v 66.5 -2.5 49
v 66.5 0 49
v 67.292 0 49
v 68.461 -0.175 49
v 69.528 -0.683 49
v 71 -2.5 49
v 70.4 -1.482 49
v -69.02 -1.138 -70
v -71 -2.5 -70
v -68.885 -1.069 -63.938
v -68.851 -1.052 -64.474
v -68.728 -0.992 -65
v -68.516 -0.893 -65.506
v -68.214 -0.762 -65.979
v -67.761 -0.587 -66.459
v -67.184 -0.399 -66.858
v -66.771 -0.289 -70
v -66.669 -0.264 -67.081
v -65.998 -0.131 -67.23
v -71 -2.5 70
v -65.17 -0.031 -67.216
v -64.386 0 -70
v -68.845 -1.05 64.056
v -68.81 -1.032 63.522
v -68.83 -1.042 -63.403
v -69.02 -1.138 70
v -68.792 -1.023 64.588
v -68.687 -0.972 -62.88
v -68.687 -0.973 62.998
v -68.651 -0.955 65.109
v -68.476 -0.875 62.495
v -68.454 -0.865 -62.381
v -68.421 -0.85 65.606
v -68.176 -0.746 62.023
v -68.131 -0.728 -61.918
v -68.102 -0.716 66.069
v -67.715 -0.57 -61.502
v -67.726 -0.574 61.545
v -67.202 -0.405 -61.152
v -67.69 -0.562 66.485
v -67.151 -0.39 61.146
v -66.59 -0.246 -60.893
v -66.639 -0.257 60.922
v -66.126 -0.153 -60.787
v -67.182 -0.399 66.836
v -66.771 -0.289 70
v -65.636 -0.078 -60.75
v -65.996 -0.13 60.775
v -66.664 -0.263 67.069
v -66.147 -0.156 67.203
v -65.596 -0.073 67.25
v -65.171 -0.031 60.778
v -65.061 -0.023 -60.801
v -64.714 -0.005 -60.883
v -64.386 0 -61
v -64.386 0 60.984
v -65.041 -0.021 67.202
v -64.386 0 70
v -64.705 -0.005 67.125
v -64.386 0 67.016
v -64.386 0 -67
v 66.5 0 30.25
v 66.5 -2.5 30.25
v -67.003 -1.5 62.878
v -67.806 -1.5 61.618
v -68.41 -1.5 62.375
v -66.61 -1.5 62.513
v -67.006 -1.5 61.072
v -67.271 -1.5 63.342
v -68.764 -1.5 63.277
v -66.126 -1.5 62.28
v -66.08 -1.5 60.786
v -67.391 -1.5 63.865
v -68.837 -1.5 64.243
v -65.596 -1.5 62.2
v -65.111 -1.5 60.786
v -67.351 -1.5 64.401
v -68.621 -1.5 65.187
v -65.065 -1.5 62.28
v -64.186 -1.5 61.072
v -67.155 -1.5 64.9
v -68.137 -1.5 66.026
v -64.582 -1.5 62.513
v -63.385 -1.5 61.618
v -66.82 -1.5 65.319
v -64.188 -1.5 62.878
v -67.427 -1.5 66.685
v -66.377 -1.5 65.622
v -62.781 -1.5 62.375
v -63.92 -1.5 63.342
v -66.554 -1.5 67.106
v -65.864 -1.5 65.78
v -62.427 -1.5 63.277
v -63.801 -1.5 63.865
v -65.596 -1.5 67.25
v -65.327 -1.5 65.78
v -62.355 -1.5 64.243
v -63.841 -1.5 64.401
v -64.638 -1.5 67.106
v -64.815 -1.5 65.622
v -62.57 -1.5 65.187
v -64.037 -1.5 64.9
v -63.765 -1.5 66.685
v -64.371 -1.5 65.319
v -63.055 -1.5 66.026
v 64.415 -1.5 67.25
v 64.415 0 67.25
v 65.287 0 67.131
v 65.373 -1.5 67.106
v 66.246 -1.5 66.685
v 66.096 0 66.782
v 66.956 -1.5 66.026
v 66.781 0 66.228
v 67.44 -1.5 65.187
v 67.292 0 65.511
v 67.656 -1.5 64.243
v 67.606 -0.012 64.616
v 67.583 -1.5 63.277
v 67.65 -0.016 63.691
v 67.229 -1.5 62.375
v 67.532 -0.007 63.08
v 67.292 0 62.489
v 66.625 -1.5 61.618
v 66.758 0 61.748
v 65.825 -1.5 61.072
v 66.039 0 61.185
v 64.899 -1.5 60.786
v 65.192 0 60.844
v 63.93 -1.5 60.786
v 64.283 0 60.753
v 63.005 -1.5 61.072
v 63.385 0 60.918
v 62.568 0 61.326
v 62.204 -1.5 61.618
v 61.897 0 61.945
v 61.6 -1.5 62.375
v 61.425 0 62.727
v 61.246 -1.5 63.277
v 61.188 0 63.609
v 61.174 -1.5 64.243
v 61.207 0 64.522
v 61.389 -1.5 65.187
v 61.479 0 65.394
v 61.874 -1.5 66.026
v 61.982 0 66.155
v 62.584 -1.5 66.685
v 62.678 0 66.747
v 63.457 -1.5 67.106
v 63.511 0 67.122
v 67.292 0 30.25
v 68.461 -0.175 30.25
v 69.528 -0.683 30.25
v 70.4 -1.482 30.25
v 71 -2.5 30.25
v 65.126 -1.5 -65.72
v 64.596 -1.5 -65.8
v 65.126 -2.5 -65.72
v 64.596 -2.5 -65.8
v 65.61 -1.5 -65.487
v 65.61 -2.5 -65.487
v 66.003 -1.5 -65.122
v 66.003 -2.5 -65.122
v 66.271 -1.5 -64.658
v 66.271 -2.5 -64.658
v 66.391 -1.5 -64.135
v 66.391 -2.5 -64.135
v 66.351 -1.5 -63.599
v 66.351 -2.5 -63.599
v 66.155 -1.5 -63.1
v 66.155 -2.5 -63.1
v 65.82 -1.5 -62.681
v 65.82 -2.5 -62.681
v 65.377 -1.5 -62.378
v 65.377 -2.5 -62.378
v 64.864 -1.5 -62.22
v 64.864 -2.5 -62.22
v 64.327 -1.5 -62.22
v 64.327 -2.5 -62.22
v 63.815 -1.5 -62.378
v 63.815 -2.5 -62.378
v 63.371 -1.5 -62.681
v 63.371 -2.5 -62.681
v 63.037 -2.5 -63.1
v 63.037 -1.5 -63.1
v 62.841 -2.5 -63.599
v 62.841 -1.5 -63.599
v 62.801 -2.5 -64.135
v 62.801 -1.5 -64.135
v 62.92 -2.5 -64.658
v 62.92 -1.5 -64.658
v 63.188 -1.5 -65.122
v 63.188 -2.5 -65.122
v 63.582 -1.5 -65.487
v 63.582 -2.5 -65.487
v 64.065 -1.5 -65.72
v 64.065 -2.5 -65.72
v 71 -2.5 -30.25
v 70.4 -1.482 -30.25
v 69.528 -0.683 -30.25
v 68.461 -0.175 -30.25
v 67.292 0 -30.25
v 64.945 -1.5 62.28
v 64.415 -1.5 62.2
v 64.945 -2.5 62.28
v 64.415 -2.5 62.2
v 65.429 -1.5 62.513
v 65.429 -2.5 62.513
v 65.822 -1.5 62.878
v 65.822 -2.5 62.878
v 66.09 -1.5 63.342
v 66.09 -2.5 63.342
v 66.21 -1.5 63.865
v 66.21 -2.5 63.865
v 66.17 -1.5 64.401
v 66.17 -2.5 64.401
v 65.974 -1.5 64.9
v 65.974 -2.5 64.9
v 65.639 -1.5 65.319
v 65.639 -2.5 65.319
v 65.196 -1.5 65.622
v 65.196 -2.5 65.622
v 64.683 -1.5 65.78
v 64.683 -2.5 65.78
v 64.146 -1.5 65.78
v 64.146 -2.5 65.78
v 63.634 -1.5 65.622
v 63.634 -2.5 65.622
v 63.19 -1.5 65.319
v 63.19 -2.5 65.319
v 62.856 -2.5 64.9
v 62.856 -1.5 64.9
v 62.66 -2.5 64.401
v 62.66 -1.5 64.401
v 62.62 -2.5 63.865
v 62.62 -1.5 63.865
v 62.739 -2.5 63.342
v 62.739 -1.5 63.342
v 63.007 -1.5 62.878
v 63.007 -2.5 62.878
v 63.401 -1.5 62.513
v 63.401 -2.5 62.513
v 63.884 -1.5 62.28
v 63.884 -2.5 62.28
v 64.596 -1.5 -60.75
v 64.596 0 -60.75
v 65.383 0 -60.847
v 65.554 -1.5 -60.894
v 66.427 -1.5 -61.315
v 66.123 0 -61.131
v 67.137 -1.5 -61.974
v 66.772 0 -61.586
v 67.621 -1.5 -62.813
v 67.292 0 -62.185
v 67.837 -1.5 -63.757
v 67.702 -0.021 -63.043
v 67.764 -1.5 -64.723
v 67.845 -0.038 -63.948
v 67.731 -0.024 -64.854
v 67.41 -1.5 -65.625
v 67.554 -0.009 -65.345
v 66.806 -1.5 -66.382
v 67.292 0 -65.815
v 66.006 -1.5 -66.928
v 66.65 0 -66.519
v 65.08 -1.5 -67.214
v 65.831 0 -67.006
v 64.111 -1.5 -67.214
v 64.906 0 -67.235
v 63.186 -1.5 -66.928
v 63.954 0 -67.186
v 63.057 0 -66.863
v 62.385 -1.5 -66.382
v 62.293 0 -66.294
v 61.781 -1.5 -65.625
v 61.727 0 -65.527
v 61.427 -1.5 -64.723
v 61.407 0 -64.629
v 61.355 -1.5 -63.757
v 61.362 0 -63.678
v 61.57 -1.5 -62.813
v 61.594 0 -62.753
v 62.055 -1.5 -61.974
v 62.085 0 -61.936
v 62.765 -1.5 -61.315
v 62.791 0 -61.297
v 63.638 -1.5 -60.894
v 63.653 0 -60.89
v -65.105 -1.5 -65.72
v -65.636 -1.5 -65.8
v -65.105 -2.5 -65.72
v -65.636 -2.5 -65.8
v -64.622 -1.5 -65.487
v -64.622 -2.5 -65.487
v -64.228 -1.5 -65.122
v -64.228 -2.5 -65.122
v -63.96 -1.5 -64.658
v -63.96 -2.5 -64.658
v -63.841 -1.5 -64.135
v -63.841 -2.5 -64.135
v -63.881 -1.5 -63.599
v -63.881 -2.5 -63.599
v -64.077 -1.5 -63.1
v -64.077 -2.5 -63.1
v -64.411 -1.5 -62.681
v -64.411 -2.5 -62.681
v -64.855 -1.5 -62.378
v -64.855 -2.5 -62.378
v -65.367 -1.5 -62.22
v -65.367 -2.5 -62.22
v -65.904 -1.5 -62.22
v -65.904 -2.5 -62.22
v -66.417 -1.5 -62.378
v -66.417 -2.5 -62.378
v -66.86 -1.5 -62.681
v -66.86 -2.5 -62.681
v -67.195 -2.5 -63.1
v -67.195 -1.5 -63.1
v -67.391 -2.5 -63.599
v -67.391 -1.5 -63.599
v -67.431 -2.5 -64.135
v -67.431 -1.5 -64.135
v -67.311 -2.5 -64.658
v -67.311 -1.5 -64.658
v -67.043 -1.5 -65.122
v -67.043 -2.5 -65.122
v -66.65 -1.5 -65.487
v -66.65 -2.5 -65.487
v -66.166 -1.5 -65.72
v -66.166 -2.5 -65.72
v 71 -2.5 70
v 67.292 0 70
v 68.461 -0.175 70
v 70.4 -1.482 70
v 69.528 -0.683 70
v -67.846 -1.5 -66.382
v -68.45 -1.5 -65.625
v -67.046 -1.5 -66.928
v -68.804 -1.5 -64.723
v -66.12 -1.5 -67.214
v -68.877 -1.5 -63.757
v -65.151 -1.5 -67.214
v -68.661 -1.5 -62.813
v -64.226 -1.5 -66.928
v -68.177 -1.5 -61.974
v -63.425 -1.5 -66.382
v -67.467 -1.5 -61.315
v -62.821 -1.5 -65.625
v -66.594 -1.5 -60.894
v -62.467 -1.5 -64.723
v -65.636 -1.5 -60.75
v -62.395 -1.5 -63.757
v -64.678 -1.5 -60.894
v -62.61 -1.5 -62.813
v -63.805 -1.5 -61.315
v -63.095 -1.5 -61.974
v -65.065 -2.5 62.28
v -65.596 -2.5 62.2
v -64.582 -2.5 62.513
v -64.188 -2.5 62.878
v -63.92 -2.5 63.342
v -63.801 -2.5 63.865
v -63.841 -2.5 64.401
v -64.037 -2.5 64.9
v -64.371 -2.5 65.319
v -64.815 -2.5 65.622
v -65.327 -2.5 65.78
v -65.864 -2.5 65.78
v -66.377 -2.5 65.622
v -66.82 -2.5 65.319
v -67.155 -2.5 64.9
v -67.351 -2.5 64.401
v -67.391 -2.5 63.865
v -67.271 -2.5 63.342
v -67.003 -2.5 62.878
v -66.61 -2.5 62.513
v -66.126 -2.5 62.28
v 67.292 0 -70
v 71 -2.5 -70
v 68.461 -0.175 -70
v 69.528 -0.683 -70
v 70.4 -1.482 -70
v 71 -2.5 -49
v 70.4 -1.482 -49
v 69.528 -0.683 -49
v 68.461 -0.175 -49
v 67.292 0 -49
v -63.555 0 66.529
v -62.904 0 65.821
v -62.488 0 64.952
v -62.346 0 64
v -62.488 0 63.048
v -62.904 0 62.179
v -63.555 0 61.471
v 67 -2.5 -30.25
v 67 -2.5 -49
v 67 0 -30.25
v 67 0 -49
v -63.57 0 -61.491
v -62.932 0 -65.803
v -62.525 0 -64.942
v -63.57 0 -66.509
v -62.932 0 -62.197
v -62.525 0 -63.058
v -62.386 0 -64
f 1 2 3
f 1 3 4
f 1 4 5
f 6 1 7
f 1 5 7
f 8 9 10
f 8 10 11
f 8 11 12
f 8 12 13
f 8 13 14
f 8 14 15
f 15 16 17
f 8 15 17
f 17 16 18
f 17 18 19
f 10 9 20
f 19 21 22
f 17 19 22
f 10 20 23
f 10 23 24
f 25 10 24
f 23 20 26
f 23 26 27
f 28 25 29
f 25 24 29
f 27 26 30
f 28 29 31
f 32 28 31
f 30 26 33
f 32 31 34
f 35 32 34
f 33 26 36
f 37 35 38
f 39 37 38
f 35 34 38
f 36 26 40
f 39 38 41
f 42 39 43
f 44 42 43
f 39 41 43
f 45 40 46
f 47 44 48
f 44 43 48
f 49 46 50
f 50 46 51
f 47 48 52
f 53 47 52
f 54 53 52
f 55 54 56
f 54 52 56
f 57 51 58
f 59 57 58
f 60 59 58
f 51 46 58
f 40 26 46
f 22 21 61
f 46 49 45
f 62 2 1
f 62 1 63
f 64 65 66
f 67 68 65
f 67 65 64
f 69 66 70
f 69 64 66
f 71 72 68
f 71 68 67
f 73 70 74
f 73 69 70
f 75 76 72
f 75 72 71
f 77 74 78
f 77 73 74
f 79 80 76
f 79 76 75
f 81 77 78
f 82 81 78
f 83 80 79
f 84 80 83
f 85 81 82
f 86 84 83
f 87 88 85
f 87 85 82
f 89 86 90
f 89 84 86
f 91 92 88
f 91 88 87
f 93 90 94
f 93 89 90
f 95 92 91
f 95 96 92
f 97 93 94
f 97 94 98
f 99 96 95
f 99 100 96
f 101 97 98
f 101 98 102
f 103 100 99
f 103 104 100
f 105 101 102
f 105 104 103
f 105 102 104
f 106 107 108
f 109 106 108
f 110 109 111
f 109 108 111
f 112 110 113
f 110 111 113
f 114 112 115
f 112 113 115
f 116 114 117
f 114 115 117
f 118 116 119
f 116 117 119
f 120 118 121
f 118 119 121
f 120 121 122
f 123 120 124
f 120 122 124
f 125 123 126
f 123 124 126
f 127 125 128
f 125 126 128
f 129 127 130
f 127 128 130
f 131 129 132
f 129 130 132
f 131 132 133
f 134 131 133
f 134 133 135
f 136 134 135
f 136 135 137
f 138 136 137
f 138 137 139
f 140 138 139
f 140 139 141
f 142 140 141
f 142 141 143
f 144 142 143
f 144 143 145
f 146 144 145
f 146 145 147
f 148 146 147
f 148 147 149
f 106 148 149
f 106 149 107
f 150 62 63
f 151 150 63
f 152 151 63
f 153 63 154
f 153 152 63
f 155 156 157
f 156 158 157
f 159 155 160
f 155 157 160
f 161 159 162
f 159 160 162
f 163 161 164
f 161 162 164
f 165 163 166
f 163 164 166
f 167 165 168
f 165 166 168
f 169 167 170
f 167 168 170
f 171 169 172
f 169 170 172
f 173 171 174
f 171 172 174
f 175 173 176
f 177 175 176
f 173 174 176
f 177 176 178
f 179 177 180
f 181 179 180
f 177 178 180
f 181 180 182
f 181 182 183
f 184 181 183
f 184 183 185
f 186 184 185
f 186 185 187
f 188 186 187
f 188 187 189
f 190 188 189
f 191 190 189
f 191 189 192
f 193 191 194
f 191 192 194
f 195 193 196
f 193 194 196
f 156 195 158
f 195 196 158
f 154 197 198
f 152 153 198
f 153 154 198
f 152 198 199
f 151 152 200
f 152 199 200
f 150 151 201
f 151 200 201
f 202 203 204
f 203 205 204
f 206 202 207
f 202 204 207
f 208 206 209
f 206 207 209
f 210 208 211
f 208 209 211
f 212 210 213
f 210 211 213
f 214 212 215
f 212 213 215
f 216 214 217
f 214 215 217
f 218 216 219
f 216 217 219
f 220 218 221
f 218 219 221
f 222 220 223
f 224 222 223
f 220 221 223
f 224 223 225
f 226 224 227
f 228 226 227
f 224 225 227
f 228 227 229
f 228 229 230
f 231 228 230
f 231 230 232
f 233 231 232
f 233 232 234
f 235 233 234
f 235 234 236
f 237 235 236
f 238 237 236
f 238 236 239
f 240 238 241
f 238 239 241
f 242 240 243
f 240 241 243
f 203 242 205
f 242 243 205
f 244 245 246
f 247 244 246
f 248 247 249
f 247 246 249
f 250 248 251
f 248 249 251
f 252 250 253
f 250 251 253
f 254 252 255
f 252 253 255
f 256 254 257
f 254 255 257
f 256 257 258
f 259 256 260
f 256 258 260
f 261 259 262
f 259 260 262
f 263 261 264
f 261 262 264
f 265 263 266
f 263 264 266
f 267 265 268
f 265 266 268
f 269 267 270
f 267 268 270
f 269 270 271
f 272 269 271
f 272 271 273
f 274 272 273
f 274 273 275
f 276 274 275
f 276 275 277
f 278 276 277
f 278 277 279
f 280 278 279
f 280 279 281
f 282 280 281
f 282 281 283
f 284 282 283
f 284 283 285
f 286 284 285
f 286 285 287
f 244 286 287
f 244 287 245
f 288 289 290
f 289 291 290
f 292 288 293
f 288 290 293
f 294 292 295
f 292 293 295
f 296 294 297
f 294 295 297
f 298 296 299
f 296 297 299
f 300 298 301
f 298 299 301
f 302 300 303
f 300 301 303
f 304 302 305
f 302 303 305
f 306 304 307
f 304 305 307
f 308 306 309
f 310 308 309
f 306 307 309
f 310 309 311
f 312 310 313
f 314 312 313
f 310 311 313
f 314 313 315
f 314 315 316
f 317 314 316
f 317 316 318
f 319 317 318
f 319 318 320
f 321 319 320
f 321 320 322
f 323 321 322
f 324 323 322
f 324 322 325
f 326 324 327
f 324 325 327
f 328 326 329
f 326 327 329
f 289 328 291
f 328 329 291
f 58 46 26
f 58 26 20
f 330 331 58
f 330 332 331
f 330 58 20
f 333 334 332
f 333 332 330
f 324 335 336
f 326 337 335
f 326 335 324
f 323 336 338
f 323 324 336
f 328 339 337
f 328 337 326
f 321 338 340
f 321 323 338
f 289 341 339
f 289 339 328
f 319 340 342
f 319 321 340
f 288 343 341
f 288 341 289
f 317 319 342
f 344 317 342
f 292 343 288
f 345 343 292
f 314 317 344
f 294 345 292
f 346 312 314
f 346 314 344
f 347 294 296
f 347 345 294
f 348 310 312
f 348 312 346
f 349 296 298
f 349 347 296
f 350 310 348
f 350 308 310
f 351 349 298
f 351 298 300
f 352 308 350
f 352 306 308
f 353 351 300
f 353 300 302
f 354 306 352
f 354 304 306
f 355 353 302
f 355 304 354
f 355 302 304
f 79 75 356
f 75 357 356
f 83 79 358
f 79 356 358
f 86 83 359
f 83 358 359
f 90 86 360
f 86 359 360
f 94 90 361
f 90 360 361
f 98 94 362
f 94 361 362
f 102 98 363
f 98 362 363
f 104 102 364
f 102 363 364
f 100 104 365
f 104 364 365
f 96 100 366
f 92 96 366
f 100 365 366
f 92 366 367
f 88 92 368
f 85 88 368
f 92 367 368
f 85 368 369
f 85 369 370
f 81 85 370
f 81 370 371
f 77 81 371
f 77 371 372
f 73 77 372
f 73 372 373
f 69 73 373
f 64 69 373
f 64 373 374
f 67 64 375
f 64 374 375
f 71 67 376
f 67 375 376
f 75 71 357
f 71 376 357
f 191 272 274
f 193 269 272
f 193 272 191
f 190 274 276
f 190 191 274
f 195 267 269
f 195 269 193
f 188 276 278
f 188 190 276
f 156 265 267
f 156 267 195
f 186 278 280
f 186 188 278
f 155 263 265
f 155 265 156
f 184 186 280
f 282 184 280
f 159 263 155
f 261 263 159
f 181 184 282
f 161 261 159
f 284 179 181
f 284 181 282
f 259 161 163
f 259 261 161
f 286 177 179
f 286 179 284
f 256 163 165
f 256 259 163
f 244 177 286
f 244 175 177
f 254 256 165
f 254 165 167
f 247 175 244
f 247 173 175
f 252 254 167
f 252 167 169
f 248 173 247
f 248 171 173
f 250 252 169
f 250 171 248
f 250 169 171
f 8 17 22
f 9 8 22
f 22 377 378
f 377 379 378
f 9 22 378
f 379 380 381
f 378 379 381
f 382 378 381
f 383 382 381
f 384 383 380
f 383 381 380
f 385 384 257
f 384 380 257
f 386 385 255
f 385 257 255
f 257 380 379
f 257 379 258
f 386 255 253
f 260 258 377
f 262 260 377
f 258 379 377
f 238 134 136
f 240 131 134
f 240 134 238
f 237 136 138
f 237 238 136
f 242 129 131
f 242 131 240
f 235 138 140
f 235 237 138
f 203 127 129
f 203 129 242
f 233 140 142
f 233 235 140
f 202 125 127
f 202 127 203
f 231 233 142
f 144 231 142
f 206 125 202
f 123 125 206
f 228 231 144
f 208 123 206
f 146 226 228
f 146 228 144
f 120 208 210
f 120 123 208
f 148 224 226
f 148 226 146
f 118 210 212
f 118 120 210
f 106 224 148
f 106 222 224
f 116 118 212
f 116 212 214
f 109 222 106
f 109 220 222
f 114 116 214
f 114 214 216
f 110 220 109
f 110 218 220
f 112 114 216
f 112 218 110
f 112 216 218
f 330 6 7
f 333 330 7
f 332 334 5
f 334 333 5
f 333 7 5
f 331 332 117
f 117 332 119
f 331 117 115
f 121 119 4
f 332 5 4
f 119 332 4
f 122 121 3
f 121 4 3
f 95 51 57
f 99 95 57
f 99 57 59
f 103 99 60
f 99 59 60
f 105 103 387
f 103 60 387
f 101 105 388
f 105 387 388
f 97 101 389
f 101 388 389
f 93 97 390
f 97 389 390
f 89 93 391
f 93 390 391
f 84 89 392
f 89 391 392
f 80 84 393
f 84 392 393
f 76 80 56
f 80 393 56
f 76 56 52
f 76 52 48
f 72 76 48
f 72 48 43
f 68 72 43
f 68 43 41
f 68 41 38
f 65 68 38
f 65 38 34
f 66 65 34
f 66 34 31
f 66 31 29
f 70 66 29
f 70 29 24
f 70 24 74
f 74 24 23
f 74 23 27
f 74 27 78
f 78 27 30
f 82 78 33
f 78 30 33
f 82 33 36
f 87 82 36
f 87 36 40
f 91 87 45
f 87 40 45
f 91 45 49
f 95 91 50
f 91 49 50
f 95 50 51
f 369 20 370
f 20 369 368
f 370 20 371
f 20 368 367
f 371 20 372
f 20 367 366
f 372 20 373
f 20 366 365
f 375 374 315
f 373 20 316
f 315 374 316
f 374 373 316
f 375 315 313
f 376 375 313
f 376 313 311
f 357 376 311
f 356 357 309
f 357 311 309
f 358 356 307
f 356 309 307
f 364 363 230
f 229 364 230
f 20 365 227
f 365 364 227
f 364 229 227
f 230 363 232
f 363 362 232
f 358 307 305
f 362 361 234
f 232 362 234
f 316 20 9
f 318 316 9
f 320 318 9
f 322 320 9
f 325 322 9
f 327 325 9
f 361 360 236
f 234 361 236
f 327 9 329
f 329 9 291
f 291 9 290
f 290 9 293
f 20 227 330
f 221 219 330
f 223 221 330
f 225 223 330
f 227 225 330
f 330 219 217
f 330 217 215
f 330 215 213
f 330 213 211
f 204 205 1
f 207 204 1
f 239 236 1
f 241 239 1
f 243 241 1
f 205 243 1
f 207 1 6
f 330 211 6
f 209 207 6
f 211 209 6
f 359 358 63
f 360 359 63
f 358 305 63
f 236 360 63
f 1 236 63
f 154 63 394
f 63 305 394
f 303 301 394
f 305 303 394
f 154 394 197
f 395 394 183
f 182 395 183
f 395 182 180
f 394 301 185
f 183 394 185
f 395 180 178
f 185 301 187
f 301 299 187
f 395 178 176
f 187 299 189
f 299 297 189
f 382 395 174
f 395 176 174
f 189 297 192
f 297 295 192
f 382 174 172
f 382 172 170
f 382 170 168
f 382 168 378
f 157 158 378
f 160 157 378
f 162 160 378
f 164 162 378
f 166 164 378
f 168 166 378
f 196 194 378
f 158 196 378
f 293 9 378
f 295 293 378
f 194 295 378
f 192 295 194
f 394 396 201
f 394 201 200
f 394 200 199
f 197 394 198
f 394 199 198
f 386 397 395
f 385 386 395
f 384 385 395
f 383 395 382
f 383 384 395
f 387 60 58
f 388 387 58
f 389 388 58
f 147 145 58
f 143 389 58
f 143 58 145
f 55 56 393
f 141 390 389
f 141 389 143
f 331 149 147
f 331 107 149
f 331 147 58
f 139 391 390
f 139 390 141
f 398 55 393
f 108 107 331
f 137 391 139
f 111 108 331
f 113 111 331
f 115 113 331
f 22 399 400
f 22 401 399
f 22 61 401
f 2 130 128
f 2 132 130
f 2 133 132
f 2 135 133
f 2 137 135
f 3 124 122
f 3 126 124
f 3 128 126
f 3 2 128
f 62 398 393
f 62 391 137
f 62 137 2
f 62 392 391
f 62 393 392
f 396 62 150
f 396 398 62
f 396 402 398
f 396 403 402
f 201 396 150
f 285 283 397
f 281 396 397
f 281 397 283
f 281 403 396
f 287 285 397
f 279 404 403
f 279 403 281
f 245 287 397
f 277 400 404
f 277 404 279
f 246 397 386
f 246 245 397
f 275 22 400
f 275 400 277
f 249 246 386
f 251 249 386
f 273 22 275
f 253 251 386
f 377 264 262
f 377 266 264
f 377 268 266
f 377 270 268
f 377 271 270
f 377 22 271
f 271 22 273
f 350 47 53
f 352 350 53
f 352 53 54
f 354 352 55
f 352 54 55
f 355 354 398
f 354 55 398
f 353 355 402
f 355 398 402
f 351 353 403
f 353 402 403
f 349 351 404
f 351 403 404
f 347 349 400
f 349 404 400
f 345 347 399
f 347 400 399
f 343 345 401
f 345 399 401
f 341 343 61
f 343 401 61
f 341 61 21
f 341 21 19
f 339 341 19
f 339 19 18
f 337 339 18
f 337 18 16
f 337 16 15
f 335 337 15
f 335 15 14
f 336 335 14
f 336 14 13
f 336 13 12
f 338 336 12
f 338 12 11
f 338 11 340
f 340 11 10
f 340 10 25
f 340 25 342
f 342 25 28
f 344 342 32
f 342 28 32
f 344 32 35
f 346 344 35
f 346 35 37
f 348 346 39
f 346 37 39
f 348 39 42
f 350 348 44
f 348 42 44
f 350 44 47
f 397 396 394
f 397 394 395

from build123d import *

# Parameters (mm, degrees)
SKETCH1_W                                   = 142
SKETCH1_H                                   = 140
BOSS_EXTRUDE1_DEPTH                         = 2.5
SKETCH6_W                                   = 4
SKETCH6_H                                   = 18.75
CUT_EXTRUDE1_DEPTH                          = 100.735901259
SKETCH7_W                                   = 4.5
SKETCH7_H                                   = 18.75
CUT_EXTRUDE2_DEPTH                          = 100.735901259
CBORE_FOR_M3_CHEESE_HEAD_SCREW1_D           = 3.6
CBORE_FOR_M3_CHEESE_HEAD_SCREW1_CBORE_D     = 6.5
CBORE_FOR_M3_CHEESE_HEAD_SCREW1_CBORE_DEPTH = 1.5
FILLET4_R                                   = 10
FILLET7_R                                   = 4


with BuildPart() as part:
    # Sketch1 → Boss-Extrude1 (new body)
    with BuildSketch(Plane(origin=(0, 0, 0), x_dir=(1, 0, 0), z_dir=(0, 1, 0))):
        Rectangle(SKETCH1_W, SKETCH1_H)
    extrude(amount=-BOSS_EXTRUDE1_DEPTH)

    # Sketch6 → Cut-Extrude1 (cut, through all)
    with BuildSketch(Plane(origin=(0, 0, 0), x_dir=(1, 0, 0), z_dir=(0, 1, 0))):
        with Locations((69, 39.625)):
            Rectangle(SKETCH6_W, SKETCH6_H)
    extrude(amount=-CUT_EXTRUDE1_DEPTH, mode=Mode.SUBTRACT)

    # Sketch7 → Cut-Extrude2 (cut, through all)
    with BuildSketch(Plane(origin=(0, 0, 0), x_dir=(1, 0, 0), z_dir=(0, 1, 0))):
        with Locations((68.75, -39.625)):
            Rectangle(SKETCH7_W, SKETCH7_H)
    extrude(amount=-CUT_EXTRUDE2_DEPTH, mode=Mode.SUBTRACT)

    # CBORE for M3 Cheese Head Screw1 (through all)
    with Locations(Plane(origin=(-65.6357603, 0, -64), x_dir=(0, 0, 1), z_dir=(0, 1, 0))):
        with Locations((0, 0), (0, 130.23152632), (128, 130.05051113), (128, 0.0399943)):
            CounterBoreHole(CBORE_FOR_M3_CHEESE_HEAD_SCREW1_D / 2, CBORE_FOR_M3_CHEESE_HEAD_SCREW1_CBORE_D / 2, CBORE_FOR_M3_CHEESE_HEAD_SCREW1_CBORE_DEPTH)

    # Fillet4
    # the kernel refuses this fillet: 10 mm, written as the material it takes off along each edge
    with BuildSketch(Plane(origin=(-71, 0, 86.535945694), x_dir=(0, -1, 0), z_dir=(0, 0, -1))) as fillet4_piece_1:
        with BuildLine():
            CenterArc((10, -6.614378278), FILLET4_R, 138.590377891, 41.409622109)
            Line((0, -6.614378278), (-0.2, -6.614378278))
            Line((-0.2, -6.614378278), (-0.2, 0))
            Line((-0.2, 0), (0, 0.2))
            ThreePointArc((0, 0.2), (1.25, 0.2), (2.35, 0.132287566))
            Line((2.35, 0.132287566), (2.5, 0))
        make_face()
    extrude(amount=173.071891388, mode=Mode.SUBTRACT)

    # Fillet7
    # the kernel refuses this fillet: 4 mm, written as the material it takes off along each edge
    with BuildSketch(Plane(origin=(71, 0, 39.729751891), x_dir=(-1, 0, 0), z_dir=(0, 0, 1)), Plane(origin=(71, 0, -79.270248109), x_dir=(-1, 0, 0), z_dir=(0, 0, 1))) as fillet7_piece_1:
        with BuildLine():
            CenterArc((3.708099244, 4), FILLET7_R, 202.024312837, 67.975687163)
            Line((0, 2.5), (-0.074161985, 2.47))
            ThreePointArc((-0.074161985, 2.47), (-0.08, 1.25), (-0.08, 0))
            Line((-0.08, 0), (0, -0.08))
            Line((0, -0.08), (3.708099244, -0.08))
            Line((3.708099244, -0.08), (3.708099244, 0))
        make_face()
    extrude(amount=39.540496218, mode=Mode.SUBTRACT)
    with BuildSketch(Plane(origin=(71, 0, -39.520248109), x_dir=(-1, 0, 0), z_dir=(0, 0, 1))) as fillet7_piece_2:
        with BuildLine():
            CenterArc((3.708099244, 4), FILLET7_R, 202.024312837, 67.975687163)
            Line((0, 2.5), (-0.074161985, 2.47))
            ThreePointArc((-0.074161985, 2.47), (-0.08, 1.25), (-0.08, 0))
            Line((-0.08, 0), (0, -0.08))
            Line((0, -0.08), (3.708099244, -0.08))
            Line((3.708099244, -0.08), (3.708099244, 0))
        make_face()
    extrude(amount=79.040496218, mode=Mode.SUBTRACT)


solid = part.part
